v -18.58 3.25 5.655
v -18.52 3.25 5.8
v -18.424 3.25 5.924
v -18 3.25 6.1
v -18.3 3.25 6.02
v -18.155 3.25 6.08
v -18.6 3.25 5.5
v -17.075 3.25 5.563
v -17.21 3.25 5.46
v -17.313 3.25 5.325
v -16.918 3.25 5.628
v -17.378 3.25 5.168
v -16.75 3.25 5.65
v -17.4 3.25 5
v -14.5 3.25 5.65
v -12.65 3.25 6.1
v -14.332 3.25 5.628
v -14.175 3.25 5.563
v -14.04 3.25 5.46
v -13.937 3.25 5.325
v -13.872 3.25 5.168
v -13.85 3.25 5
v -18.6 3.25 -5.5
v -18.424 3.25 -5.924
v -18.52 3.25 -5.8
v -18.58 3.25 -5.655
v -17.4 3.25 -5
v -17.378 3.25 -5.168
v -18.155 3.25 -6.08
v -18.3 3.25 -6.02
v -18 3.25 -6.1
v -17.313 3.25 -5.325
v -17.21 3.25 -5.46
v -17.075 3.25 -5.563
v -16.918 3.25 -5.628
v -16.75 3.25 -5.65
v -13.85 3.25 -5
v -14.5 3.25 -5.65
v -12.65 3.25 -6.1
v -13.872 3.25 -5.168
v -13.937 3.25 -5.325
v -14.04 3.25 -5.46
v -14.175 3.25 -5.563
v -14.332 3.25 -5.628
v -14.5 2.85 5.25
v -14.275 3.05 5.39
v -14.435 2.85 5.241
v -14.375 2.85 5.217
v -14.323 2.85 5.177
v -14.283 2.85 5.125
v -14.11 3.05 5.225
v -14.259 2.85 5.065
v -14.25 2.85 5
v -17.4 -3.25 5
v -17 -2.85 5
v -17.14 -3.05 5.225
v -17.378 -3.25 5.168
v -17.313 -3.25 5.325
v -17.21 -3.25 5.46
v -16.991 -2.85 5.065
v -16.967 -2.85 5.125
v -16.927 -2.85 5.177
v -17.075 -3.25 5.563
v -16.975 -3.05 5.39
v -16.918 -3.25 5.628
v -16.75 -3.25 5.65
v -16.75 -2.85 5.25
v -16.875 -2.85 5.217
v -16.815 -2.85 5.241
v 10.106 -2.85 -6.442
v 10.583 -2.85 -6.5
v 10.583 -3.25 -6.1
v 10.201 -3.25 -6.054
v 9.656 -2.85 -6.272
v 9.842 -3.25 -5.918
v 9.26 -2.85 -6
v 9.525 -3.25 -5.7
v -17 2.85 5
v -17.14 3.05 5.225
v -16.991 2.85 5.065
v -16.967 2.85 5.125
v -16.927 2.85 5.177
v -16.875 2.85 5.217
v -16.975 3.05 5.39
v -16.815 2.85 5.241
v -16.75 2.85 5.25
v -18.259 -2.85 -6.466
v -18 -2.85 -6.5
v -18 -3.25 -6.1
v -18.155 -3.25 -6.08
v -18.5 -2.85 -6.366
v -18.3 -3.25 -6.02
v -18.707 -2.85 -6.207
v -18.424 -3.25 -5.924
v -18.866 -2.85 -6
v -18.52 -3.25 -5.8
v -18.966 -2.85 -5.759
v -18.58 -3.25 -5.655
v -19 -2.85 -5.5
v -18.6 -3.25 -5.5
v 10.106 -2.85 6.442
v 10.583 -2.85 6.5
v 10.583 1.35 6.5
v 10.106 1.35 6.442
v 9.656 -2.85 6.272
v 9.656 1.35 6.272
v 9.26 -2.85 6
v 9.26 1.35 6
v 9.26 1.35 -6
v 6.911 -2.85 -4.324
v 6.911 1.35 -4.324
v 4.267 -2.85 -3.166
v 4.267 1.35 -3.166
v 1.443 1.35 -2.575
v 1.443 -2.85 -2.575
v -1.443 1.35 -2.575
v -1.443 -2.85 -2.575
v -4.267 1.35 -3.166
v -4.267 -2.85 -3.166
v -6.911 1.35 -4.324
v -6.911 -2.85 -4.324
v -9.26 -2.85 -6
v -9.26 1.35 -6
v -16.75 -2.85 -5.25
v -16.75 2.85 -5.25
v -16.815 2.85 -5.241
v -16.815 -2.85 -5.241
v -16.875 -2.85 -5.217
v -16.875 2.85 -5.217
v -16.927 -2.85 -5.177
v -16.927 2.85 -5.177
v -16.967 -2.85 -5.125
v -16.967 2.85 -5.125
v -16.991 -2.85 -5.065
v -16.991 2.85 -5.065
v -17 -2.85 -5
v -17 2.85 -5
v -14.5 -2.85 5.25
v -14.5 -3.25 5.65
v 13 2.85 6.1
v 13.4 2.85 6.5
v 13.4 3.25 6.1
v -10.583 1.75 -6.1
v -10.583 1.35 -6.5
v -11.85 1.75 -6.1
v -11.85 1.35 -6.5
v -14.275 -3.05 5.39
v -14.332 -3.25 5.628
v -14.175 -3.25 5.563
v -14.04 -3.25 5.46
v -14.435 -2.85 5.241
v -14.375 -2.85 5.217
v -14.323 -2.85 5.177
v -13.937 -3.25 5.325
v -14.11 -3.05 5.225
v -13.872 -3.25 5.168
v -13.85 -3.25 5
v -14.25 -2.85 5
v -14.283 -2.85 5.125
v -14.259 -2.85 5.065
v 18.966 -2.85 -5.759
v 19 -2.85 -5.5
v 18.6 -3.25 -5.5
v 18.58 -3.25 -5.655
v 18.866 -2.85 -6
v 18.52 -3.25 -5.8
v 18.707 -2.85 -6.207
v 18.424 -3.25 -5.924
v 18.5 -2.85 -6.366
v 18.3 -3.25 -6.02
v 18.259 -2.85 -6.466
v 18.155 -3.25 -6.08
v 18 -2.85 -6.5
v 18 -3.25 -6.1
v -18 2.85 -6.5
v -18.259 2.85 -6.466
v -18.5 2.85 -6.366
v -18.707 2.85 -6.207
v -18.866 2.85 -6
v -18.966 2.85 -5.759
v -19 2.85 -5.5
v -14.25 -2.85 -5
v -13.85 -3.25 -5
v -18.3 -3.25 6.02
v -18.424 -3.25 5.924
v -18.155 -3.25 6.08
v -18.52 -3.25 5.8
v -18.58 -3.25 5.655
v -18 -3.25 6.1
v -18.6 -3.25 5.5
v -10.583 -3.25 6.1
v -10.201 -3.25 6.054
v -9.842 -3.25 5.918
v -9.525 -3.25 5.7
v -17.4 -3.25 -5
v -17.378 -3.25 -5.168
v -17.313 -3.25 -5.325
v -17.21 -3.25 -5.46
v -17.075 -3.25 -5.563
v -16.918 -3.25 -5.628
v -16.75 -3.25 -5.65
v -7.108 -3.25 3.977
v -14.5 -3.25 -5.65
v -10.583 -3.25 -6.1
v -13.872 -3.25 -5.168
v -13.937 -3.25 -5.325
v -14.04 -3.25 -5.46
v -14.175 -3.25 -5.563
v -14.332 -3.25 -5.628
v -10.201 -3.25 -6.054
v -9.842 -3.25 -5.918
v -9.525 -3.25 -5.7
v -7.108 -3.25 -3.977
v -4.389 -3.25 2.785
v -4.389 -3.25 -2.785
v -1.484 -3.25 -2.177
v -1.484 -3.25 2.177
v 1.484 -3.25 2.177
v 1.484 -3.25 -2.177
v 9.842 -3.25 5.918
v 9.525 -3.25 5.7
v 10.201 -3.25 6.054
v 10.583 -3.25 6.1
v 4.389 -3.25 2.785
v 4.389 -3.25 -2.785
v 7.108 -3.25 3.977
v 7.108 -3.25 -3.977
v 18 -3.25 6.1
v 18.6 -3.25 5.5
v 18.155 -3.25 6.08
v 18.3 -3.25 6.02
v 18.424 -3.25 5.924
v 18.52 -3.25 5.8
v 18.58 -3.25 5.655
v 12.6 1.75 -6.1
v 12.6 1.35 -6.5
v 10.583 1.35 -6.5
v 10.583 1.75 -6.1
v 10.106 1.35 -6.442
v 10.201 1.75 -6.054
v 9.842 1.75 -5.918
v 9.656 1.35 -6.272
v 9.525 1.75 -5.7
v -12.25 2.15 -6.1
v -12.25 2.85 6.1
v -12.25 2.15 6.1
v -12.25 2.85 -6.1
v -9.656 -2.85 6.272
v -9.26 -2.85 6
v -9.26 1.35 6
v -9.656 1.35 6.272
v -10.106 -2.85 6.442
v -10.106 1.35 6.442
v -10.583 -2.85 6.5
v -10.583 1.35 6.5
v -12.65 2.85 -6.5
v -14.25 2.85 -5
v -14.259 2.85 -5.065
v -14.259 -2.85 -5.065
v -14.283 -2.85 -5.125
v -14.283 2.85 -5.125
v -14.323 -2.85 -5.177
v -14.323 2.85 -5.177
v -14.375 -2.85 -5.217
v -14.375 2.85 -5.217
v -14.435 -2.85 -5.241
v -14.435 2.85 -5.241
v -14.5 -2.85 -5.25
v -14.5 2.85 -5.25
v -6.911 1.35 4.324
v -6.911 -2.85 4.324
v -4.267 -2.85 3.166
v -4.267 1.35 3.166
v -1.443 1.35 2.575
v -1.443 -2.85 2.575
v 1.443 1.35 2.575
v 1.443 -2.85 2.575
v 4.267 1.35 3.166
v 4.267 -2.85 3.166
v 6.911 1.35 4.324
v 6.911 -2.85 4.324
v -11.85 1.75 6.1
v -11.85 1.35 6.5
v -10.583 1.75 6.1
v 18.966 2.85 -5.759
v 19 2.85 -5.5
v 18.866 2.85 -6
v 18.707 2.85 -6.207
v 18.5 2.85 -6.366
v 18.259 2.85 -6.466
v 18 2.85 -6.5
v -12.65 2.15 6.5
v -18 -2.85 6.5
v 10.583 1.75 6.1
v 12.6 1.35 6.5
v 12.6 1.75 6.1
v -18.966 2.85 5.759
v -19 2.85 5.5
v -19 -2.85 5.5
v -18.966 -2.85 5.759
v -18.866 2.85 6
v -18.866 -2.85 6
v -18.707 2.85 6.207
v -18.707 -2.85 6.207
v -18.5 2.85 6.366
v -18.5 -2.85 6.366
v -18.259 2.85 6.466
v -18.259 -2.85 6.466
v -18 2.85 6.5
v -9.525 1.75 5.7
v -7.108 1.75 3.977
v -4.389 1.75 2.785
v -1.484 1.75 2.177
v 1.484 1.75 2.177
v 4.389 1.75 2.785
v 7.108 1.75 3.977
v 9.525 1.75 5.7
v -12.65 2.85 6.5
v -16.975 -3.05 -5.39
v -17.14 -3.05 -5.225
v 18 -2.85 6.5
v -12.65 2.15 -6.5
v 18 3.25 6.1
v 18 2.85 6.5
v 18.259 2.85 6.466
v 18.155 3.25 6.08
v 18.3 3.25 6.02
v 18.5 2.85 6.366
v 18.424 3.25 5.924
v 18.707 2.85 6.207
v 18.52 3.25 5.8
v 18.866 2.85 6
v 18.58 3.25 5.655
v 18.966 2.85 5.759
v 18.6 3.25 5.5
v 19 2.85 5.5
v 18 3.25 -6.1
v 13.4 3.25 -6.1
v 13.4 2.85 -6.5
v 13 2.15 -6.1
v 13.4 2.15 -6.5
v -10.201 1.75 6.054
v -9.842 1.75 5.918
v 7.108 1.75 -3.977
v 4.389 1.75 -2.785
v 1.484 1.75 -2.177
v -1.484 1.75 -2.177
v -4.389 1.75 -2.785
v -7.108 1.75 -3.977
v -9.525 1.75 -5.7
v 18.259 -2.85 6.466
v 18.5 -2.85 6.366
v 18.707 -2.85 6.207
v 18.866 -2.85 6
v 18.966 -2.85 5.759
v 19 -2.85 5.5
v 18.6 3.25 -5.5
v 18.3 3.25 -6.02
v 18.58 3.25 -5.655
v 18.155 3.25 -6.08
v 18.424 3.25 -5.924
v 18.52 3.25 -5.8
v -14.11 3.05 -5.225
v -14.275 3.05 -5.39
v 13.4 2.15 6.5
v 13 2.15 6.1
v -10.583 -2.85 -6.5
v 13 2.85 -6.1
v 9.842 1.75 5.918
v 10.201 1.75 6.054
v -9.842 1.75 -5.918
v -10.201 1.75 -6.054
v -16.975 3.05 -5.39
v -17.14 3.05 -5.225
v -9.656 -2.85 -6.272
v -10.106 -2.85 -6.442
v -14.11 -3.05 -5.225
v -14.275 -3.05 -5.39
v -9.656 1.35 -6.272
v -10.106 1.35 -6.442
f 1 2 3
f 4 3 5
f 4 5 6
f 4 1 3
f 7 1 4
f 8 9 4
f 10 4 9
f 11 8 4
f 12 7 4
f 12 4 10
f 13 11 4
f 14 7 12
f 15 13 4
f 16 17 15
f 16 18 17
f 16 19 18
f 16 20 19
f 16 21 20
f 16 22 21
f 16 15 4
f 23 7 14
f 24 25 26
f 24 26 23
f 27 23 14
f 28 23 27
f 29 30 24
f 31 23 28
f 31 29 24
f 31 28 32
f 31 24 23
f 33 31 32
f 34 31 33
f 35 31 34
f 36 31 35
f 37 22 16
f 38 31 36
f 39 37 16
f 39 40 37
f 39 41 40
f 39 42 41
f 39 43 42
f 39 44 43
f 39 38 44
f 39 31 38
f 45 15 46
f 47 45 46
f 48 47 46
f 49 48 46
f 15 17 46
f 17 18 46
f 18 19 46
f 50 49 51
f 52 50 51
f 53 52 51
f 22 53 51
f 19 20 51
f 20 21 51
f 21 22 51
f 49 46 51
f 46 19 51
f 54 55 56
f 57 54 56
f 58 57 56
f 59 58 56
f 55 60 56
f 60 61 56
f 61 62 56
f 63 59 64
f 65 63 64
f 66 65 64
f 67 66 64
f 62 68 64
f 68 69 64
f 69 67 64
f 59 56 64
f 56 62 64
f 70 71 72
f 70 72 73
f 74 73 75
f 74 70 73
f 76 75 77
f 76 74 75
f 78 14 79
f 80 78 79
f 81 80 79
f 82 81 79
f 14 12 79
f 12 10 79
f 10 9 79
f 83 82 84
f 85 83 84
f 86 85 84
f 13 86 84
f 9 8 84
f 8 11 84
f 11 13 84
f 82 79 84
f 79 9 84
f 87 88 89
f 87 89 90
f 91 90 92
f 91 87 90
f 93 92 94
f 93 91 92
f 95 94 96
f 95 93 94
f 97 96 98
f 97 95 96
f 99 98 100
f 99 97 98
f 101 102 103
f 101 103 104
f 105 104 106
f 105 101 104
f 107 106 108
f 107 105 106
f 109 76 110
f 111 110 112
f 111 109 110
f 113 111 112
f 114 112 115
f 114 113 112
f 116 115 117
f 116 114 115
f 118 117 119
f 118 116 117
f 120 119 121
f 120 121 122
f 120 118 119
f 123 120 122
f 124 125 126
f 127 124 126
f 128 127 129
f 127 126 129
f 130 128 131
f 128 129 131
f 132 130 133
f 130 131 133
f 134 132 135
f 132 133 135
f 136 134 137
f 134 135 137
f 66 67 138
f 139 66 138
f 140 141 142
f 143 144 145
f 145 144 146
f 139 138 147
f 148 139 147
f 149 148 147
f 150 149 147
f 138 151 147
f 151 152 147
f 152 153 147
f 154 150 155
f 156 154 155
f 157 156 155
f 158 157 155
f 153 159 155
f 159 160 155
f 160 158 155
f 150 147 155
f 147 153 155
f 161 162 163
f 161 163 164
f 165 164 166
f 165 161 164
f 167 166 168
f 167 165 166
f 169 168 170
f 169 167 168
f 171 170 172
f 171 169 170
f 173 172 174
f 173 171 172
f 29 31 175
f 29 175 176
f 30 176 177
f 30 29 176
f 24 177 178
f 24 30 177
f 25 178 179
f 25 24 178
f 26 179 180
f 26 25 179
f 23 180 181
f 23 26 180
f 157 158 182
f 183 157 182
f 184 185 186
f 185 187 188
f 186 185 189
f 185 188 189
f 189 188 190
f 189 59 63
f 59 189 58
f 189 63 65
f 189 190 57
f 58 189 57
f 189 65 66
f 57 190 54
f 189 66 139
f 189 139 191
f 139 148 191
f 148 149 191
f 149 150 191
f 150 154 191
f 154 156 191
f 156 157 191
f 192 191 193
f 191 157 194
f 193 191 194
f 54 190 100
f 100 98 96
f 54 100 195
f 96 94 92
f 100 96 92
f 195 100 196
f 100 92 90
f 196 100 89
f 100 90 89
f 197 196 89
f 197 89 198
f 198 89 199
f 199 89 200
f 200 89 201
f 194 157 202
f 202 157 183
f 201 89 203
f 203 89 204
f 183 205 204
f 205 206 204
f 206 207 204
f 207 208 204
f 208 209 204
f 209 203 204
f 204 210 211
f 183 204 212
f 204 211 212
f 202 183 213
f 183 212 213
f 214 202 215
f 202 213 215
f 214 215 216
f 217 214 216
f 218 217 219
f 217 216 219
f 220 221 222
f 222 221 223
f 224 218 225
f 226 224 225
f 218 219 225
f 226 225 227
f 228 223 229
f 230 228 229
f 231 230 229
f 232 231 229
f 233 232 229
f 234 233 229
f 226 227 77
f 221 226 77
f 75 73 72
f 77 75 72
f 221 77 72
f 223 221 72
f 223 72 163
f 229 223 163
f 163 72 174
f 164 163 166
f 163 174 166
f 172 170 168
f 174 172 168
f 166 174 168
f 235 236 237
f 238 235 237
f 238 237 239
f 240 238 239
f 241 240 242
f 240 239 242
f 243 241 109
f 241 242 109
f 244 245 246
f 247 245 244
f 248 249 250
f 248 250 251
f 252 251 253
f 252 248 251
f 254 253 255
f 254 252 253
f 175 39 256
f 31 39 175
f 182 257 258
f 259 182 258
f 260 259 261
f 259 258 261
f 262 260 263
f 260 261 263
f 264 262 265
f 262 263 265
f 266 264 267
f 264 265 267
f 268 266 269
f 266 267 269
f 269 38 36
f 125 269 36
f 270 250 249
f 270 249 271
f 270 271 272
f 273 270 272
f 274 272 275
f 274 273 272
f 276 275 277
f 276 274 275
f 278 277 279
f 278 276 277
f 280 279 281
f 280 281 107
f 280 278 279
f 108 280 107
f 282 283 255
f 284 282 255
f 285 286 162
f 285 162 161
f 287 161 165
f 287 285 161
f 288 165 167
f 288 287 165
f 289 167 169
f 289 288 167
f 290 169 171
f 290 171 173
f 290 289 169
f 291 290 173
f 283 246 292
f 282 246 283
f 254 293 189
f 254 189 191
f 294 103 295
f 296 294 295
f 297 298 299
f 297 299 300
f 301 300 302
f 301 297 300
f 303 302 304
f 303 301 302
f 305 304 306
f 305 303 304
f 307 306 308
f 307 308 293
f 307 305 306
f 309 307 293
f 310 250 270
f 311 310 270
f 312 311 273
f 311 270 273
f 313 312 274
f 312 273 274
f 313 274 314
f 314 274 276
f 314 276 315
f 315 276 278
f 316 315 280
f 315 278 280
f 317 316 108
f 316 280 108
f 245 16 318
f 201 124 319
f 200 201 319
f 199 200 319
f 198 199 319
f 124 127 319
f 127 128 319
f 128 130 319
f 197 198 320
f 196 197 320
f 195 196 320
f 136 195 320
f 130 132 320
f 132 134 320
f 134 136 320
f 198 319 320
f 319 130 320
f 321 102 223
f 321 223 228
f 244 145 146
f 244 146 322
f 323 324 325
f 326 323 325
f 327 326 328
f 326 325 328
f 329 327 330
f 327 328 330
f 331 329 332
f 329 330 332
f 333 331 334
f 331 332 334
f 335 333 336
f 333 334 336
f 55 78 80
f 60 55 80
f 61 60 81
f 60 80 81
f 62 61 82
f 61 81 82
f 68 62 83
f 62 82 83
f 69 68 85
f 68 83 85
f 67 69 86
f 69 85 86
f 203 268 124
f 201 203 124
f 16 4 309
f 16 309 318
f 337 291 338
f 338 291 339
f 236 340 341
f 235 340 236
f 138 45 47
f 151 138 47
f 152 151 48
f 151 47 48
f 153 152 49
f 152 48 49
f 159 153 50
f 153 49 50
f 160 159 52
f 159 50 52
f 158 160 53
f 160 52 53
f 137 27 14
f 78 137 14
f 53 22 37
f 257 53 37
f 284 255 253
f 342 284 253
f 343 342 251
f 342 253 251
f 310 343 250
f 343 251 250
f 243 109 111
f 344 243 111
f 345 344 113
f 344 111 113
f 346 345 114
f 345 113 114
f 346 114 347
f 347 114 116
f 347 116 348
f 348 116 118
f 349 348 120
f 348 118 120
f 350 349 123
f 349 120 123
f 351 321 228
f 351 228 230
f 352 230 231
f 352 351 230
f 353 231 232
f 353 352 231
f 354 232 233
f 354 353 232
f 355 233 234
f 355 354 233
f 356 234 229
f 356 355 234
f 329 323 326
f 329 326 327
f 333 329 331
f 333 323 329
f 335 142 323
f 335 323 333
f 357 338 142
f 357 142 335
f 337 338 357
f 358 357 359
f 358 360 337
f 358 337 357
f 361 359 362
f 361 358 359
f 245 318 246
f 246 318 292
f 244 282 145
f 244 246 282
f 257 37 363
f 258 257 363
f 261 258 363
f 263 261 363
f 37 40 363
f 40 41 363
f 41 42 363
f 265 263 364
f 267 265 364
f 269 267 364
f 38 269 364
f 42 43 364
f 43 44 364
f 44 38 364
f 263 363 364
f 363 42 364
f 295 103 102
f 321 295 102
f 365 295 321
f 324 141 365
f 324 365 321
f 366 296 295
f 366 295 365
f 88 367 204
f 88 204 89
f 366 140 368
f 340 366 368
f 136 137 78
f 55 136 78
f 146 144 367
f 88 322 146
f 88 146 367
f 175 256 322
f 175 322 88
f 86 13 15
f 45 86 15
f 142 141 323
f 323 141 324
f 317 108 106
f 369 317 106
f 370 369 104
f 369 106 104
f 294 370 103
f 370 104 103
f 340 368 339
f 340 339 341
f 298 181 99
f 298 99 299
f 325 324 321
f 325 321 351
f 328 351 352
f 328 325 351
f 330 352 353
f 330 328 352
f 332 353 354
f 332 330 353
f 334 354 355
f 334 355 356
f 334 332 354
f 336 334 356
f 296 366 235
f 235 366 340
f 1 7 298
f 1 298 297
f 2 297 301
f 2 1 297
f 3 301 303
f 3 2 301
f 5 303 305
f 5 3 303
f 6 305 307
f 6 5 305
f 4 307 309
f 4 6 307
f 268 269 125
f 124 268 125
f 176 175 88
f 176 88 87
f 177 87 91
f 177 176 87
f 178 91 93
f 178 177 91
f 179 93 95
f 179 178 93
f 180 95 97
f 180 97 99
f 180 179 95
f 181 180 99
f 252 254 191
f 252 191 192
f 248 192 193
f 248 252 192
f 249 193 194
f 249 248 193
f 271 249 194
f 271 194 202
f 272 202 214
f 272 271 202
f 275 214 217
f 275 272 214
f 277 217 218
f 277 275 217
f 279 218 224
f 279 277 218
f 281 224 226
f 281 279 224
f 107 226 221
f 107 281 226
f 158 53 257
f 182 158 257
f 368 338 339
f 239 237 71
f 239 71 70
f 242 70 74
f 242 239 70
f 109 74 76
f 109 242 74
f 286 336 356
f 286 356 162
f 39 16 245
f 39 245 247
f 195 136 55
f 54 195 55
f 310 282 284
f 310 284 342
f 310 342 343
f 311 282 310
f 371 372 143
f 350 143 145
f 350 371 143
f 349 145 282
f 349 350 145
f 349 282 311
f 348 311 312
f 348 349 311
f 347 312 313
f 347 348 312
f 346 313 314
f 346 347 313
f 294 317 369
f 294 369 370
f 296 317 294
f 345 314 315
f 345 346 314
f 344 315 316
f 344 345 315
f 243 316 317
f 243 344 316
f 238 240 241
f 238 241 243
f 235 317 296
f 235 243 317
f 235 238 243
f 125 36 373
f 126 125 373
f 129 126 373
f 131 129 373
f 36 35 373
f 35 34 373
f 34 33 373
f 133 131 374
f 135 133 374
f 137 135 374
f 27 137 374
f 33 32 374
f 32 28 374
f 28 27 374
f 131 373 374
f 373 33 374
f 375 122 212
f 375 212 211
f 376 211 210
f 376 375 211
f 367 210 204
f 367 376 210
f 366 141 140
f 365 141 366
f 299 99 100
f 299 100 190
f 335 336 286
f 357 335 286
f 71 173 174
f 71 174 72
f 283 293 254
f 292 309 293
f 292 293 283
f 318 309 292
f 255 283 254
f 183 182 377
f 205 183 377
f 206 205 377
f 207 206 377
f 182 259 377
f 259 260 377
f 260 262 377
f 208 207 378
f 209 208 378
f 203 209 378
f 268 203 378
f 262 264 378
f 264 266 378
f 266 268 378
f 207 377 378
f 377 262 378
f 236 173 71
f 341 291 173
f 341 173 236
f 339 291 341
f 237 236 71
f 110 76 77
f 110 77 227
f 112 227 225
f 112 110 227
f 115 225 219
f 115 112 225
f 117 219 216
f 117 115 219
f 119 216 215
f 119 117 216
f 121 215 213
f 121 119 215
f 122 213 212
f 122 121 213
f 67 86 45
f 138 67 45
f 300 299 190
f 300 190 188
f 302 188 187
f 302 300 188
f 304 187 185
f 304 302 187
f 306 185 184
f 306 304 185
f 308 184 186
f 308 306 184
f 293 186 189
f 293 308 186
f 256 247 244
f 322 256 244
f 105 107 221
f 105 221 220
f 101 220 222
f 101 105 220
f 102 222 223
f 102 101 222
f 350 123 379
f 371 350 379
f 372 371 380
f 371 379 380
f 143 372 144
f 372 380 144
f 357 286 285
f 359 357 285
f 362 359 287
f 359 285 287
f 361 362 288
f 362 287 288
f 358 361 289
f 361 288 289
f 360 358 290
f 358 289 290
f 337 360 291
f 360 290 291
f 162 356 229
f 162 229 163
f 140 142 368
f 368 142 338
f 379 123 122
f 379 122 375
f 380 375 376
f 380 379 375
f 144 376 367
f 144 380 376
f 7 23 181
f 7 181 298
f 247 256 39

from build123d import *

# Parameters (mm, degrees)
BOSS_EXTRUDE1_DEPTH = 3.25
SKETCH2_W           = 25.25
SKETCH2_H           = 13
CUT_EXTRUDE1_DEPTH  = 1.5
FILLET1_R           = 2
CHAMFER1_SIZE       = 0.4


with BuildPart() as part:
    # Sketch1 → Boss-Extrude1 (new body, symmetric)
    with BuildSketch(Plane(origin=(0, 0, 0), x_dir=(1, 0, 0), z_dir=(0, 1, 0))):
        with BuildLine():
            Line((18, 6.5), (9.797958971, 6.5))
            ThreePointArc((9.797958971, 6.5), (0, 2.5), (-9.797958971, 6.5))
            Line((-9.797958971, 6.5), (-18, 6.5))
            ThreePointArc((-18, 6.5), (-18.707106781, 6.207106781), (-19, 5.5))
            Line((-19, 5.5), (-19, -5.5))
            ThreePointArc((-19, -5.5), (-18.707106781, -6.207106781), (-18, -6.5))
            Line((-18, -6.5), (-9.797958971, -6.5))
            ThreePointArc((-9.797958971, -6.5), (0, -2.5), (9.797958971, -6.5))
            Line((9.797958971, -6.5), (18, -6.5))
            ThreePointArc((18, -6.5), (18.707106781, -6.207106781), (19, -5.5))
            Line((19, -5.5), (19, 5.5))
            ThreePointArc((19, 5.5), (18.707106781, 6.207106781), (18, 6.5))
        make_face()
        with BuildLine():
            Line((-16.75, -5.25), (-14.5, -5.25))
            ThreePointArc((-14.5, -5.25), (-14.323223305, -5.176776695), (-14.25, -5))
            Line((-14.25, -5), (-14.25, 5))
            ThreePointArc((-14.25, 5), (-14.323223305, 5.176776695), (-14.5, 5.25))
            Line((-14.5, 5.25), (-16.75, 5.25))
            ThreePointArc((-16.75, 5.25), (-16.926776695, 5.176776695), (-17, 5))
            Line((-17, 5), (-17, -5))
            ThreePointArc((-17, -5), (-16.926776695, -5.176776695), (-16.75, -5.25))
        make_face(mode=Mode.SUBTRACT)
    extrude(amount=BOSS_EXTRUDE1_DEPTH, both=True)

    # Sketch2 → Cut-Extrude1 (cut)
    with BuildSketch(Plane(origin=(0, 3.25, 0), x_dir=(1, 0, 0), z_dir=(0, 1, 0))):
        with Locations((0.375, 0)):
            Rectangle(SKETCH2_W, SKETCH2_H)
    extrude(amount=-CUT_EXTRUDE1_DEPTH, mode=Mode.SUBTRACT)

    # Fillet1
    fillet1_edges = [part.edges().sort_by_distance(p)[0] for p in [
        (9.797958971, -0.75, 6.5),
        (-9.797958971, -0.75, 6.5),
        (-9.797958971, -0.75, -6.5),
        (9.797958971, -0.75, -6.5),
    ]]
    fillet(fillet1_edges, radius=FILLET1_R)

    # Chamfer1
    chamfer1_edges = [part.edges().sort_by_distance(p)[0] for p in [
        (-9.875898463, 1.75, -6.370828693),
        (19, -3.25, 0),
        (18.707106781, -3.25, 6.207106781),
        (-14.291502622, -3.25, 6.5),
        (-18.707106781, -3.25, 6.207106781),
        (-19, -3.25, 0),
        (-18.707106781, -3.25, -6.207106781),
        (14.291502622, -3.25, -6.5),
        (18.707106781, -3.25, -6.207106781),
        (-18.707106781, 3.25, -6.207106781),
        (-19, 3.25, 0),
        (-18.707106781, 3.25, 6.207106781),
        (-15.125, 3.25, 6.5),
        (-16.926776695, -3.25, 5.176776695),
        (-15.625, -3.25, 5.25),
        (-14.323223305, -3.25, 5.176776695),
        (-14.25, -3.25, 0),
        (-14.323223305, -3.25, -5.176776695),
        (-15.625, -3.25, -5.25),
        (-16.926776695, -3.25, -5.176776695),
        (-17, -3.25, 0),
        (-16.926776695, 3.25, 5.176776695),
        (-15.625, 3.25, 5.25),
        (-14.323223305, 3.25, 5.176776695),
        (-14.25, 3.25, 0),
        (-14.323223305, 3.25, -5.176776695),
        (-15.625, 3.25, -5.25),
        (-16.926776695, 3.25, -5.176776695),
        (-17, 3.25, 0),
        (18.707106781, 3.25, 6.207106781),
        (19, 3.25, 0),
        (18.707106781, 3.25, -6.207106781),
        (15.5, 3.25, 6.5),
        (11.791502622, 1.75, 6.5),
        (-15.125, 3.25, -6.5),
        (11.791502622, 1.75, -6.5),
        (-12.25, 2.5, -6.5),
        (-11.416502622, 1.75, 6.5),
        (13, 2.5, 6.5),
        (-12.25, 3.25, 0),
        (13, 3.25, 0),
        (13, 1.75, 0),
        (13, 2.5, -6.5),
        (-12.25, 1.75, 0),
        (-12.25, 2.5, 6.5),
        (15.5, 3.25, -6.5),
        (-11.416502622, 1.75, -6.5),
        (-14.291502622, -3.25, -6.5),
        (14.291502622, -3.25, 6.5),
        (0, -3.25, 2.5),
        (0, -3.25, -2.5),
        (-9.875898463, -3.25, 6.370828693),
        (9.875898463, -3.25, 6.370828693),
        (9.875898463, -3.25, -6.370828693),
        (-9.875898463, -3.25, -6.370828693),
        (0, 1.75, -2.5),
        (0, 1.75, 2.5),
        (-9.875898463, 1.75, 6.370828693),
        (9.875898463, 1.75, 6.370828693),
        (9.875898463, 1.75, -6.370828693),
    ]]
    chamfer(chamfer1_edges, length=CHAMFER1_SIZE)


solid = part.part
